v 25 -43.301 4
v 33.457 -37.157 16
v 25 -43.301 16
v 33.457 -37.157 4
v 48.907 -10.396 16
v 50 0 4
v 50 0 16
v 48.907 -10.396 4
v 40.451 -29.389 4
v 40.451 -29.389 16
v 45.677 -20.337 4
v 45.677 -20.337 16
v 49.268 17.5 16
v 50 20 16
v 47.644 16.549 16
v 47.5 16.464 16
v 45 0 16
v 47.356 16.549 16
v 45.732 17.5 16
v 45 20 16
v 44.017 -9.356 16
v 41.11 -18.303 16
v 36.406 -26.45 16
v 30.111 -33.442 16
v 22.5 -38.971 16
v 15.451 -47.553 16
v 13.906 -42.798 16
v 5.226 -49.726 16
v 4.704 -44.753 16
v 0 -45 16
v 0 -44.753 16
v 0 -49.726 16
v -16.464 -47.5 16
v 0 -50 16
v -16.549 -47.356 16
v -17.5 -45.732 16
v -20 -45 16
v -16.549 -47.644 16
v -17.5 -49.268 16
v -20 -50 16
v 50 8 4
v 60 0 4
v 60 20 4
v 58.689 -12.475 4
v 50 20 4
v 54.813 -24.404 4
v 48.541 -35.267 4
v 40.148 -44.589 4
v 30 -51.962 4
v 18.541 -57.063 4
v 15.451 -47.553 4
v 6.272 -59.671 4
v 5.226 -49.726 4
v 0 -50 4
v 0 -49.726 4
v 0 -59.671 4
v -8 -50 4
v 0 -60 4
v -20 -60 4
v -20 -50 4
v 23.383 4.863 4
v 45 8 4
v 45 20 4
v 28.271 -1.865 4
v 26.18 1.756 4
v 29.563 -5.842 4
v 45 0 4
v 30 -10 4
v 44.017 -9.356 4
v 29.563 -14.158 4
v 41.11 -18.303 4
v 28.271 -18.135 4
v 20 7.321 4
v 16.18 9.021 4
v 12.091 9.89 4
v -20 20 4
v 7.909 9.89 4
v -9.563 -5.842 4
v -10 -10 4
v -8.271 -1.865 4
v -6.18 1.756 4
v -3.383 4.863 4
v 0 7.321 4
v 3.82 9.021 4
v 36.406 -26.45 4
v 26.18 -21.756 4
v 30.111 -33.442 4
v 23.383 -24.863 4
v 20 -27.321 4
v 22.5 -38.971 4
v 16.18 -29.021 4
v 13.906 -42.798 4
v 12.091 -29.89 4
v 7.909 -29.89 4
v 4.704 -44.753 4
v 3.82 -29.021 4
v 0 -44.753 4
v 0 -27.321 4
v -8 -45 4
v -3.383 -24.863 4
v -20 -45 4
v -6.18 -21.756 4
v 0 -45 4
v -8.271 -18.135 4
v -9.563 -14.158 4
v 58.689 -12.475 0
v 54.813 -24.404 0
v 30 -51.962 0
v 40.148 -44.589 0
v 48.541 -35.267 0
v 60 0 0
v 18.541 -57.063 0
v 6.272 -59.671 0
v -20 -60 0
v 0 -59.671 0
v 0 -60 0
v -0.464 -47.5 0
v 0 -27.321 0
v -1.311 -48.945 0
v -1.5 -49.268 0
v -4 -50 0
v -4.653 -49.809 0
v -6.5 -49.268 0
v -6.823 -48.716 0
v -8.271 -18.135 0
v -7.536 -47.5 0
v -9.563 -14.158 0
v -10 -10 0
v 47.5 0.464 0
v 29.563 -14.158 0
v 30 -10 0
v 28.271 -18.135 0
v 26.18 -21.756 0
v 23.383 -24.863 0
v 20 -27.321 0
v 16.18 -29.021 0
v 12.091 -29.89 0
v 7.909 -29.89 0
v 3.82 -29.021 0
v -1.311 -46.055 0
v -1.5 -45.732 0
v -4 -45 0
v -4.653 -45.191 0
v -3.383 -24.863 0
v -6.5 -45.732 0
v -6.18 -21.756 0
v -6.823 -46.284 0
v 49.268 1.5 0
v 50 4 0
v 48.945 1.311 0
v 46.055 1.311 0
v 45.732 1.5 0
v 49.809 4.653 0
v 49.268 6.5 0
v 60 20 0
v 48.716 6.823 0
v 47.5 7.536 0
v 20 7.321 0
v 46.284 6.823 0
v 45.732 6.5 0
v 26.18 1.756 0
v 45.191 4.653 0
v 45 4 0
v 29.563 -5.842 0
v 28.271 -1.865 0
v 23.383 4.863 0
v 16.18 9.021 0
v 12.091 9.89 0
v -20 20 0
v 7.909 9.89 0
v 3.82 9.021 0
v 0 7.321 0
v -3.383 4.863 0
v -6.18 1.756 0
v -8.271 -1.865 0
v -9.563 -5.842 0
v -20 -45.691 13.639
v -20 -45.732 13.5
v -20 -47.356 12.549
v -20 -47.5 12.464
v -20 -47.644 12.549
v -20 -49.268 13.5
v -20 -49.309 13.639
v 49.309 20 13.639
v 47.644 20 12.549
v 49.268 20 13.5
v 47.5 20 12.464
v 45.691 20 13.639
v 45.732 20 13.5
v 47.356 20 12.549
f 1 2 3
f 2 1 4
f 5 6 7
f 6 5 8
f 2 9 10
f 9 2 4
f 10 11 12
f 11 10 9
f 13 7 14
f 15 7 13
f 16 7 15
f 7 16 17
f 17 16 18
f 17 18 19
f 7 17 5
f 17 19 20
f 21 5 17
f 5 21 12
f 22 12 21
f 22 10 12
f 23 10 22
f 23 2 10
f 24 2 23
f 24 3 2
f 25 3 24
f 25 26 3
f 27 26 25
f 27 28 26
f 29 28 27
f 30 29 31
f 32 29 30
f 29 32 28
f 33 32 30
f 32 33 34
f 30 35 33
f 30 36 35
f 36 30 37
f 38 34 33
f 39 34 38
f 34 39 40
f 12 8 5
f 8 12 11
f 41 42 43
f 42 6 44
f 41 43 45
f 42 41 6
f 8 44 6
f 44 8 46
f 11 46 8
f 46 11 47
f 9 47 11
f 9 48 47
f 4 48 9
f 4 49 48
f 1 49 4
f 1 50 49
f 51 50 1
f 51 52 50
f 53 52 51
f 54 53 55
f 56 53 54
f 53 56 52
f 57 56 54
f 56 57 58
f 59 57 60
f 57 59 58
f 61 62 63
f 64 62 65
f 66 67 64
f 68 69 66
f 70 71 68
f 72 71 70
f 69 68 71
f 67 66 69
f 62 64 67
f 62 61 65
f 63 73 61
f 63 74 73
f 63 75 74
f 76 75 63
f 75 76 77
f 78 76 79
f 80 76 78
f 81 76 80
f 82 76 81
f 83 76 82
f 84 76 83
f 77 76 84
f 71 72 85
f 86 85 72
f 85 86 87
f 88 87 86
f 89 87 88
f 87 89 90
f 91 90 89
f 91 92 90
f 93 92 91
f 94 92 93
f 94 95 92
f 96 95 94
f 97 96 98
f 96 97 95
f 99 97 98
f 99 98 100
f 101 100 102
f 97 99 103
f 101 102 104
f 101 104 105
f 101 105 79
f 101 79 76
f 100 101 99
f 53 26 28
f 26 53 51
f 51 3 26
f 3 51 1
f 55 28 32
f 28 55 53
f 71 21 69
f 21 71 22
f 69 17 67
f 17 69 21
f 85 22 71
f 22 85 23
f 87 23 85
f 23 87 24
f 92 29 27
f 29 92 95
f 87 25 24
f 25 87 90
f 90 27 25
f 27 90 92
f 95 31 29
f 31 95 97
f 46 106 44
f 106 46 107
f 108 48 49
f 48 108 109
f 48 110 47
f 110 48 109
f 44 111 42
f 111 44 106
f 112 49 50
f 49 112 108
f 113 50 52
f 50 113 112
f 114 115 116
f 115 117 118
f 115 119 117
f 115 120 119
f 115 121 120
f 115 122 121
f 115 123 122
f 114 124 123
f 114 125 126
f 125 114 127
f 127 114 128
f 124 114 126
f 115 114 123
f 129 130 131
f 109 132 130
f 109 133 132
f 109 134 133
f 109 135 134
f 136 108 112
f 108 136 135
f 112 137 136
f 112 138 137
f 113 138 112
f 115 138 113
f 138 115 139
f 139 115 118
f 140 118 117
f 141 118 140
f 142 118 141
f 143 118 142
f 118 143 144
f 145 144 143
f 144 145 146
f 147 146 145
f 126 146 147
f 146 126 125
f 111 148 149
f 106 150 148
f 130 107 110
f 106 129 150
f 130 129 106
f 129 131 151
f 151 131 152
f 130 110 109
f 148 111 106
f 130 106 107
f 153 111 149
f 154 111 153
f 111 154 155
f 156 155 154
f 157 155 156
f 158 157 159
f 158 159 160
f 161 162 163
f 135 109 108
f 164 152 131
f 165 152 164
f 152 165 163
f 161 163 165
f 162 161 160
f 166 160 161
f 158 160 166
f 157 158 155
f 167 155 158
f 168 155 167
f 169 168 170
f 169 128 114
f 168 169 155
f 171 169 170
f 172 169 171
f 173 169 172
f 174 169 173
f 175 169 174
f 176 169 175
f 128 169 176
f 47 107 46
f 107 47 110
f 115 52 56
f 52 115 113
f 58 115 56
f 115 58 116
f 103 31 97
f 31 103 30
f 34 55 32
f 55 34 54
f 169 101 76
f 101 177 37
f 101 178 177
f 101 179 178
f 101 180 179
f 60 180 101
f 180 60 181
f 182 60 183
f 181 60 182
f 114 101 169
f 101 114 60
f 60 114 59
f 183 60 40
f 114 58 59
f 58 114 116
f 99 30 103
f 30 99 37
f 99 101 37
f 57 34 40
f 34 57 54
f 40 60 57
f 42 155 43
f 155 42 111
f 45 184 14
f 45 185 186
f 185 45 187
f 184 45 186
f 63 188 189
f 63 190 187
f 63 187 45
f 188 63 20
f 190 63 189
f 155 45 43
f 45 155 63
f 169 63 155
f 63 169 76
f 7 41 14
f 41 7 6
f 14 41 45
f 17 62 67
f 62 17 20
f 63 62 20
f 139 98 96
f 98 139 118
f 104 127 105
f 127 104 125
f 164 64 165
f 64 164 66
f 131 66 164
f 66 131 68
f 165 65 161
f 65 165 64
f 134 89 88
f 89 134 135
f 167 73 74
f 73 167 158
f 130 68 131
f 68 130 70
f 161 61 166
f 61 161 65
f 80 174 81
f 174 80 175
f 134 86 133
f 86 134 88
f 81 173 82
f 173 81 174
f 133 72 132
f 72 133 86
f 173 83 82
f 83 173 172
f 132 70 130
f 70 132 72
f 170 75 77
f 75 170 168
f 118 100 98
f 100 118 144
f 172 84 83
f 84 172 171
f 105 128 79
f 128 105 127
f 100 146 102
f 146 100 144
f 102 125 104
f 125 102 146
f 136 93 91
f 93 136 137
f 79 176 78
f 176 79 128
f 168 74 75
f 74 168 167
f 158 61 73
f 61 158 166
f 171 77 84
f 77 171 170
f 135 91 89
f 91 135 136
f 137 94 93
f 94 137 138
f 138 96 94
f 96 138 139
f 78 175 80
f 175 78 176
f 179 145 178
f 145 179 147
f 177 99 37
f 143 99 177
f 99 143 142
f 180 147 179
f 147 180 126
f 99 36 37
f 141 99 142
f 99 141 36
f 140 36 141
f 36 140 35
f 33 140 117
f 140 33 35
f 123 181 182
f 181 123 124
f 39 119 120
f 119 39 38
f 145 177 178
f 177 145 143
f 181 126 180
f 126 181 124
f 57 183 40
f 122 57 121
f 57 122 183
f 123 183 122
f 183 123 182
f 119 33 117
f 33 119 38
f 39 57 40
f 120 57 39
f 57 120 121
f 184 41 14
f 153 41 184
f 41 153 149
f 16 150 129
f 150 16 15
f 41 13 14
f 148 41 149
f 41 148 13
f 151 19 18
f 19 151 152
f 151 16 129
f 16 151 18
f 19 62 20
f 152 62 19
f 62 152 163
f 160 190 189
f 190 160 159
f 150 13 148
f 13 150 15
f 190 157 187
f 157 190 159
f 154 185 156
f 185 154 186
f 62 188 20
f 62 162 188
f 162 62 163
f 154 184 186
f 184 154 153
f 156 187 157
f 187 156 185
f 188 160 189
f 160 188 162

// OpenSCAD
difference() {
  union() {
    difference() {
      union() {
        cylinder(h=4, r=60);
        translate([0, 0, 4]) {
          difference() {
            cylinder(h=12, r=50);
            cylinder(h=12, r=45);
          }
        }
      }  
      translate([-60, 0, 0]) cube([120, 60, 16]);
      translate([-60, -60, 0]) cube([60, 120, 16]);
    }

    translate([-20, -60, 0]) cube([20, 60, 4]);
    translate([-20, -50, 0]) cube([20, 5, 16]);

    translate([-20, 0, 0]) cube([80, 20, 4]);
    translate([45, 0, 0]) cube([5, 20, 16]);
  }
  
  translate([10, -10, 0]) cylinder(h=4, r=20);

  translate([-20, -47.5, 16]) rotate([0, 135, 0]) cylinder(h=30, r=2.5);
  translate([47.5, 20, 16]) rotate([135, 0, 0]) cylinder(h=30, r=2.5);

}

//translate([-20, -47.5, 16]) rotate([0, 135, 0]) cylinder(h=30, r=2.5);
